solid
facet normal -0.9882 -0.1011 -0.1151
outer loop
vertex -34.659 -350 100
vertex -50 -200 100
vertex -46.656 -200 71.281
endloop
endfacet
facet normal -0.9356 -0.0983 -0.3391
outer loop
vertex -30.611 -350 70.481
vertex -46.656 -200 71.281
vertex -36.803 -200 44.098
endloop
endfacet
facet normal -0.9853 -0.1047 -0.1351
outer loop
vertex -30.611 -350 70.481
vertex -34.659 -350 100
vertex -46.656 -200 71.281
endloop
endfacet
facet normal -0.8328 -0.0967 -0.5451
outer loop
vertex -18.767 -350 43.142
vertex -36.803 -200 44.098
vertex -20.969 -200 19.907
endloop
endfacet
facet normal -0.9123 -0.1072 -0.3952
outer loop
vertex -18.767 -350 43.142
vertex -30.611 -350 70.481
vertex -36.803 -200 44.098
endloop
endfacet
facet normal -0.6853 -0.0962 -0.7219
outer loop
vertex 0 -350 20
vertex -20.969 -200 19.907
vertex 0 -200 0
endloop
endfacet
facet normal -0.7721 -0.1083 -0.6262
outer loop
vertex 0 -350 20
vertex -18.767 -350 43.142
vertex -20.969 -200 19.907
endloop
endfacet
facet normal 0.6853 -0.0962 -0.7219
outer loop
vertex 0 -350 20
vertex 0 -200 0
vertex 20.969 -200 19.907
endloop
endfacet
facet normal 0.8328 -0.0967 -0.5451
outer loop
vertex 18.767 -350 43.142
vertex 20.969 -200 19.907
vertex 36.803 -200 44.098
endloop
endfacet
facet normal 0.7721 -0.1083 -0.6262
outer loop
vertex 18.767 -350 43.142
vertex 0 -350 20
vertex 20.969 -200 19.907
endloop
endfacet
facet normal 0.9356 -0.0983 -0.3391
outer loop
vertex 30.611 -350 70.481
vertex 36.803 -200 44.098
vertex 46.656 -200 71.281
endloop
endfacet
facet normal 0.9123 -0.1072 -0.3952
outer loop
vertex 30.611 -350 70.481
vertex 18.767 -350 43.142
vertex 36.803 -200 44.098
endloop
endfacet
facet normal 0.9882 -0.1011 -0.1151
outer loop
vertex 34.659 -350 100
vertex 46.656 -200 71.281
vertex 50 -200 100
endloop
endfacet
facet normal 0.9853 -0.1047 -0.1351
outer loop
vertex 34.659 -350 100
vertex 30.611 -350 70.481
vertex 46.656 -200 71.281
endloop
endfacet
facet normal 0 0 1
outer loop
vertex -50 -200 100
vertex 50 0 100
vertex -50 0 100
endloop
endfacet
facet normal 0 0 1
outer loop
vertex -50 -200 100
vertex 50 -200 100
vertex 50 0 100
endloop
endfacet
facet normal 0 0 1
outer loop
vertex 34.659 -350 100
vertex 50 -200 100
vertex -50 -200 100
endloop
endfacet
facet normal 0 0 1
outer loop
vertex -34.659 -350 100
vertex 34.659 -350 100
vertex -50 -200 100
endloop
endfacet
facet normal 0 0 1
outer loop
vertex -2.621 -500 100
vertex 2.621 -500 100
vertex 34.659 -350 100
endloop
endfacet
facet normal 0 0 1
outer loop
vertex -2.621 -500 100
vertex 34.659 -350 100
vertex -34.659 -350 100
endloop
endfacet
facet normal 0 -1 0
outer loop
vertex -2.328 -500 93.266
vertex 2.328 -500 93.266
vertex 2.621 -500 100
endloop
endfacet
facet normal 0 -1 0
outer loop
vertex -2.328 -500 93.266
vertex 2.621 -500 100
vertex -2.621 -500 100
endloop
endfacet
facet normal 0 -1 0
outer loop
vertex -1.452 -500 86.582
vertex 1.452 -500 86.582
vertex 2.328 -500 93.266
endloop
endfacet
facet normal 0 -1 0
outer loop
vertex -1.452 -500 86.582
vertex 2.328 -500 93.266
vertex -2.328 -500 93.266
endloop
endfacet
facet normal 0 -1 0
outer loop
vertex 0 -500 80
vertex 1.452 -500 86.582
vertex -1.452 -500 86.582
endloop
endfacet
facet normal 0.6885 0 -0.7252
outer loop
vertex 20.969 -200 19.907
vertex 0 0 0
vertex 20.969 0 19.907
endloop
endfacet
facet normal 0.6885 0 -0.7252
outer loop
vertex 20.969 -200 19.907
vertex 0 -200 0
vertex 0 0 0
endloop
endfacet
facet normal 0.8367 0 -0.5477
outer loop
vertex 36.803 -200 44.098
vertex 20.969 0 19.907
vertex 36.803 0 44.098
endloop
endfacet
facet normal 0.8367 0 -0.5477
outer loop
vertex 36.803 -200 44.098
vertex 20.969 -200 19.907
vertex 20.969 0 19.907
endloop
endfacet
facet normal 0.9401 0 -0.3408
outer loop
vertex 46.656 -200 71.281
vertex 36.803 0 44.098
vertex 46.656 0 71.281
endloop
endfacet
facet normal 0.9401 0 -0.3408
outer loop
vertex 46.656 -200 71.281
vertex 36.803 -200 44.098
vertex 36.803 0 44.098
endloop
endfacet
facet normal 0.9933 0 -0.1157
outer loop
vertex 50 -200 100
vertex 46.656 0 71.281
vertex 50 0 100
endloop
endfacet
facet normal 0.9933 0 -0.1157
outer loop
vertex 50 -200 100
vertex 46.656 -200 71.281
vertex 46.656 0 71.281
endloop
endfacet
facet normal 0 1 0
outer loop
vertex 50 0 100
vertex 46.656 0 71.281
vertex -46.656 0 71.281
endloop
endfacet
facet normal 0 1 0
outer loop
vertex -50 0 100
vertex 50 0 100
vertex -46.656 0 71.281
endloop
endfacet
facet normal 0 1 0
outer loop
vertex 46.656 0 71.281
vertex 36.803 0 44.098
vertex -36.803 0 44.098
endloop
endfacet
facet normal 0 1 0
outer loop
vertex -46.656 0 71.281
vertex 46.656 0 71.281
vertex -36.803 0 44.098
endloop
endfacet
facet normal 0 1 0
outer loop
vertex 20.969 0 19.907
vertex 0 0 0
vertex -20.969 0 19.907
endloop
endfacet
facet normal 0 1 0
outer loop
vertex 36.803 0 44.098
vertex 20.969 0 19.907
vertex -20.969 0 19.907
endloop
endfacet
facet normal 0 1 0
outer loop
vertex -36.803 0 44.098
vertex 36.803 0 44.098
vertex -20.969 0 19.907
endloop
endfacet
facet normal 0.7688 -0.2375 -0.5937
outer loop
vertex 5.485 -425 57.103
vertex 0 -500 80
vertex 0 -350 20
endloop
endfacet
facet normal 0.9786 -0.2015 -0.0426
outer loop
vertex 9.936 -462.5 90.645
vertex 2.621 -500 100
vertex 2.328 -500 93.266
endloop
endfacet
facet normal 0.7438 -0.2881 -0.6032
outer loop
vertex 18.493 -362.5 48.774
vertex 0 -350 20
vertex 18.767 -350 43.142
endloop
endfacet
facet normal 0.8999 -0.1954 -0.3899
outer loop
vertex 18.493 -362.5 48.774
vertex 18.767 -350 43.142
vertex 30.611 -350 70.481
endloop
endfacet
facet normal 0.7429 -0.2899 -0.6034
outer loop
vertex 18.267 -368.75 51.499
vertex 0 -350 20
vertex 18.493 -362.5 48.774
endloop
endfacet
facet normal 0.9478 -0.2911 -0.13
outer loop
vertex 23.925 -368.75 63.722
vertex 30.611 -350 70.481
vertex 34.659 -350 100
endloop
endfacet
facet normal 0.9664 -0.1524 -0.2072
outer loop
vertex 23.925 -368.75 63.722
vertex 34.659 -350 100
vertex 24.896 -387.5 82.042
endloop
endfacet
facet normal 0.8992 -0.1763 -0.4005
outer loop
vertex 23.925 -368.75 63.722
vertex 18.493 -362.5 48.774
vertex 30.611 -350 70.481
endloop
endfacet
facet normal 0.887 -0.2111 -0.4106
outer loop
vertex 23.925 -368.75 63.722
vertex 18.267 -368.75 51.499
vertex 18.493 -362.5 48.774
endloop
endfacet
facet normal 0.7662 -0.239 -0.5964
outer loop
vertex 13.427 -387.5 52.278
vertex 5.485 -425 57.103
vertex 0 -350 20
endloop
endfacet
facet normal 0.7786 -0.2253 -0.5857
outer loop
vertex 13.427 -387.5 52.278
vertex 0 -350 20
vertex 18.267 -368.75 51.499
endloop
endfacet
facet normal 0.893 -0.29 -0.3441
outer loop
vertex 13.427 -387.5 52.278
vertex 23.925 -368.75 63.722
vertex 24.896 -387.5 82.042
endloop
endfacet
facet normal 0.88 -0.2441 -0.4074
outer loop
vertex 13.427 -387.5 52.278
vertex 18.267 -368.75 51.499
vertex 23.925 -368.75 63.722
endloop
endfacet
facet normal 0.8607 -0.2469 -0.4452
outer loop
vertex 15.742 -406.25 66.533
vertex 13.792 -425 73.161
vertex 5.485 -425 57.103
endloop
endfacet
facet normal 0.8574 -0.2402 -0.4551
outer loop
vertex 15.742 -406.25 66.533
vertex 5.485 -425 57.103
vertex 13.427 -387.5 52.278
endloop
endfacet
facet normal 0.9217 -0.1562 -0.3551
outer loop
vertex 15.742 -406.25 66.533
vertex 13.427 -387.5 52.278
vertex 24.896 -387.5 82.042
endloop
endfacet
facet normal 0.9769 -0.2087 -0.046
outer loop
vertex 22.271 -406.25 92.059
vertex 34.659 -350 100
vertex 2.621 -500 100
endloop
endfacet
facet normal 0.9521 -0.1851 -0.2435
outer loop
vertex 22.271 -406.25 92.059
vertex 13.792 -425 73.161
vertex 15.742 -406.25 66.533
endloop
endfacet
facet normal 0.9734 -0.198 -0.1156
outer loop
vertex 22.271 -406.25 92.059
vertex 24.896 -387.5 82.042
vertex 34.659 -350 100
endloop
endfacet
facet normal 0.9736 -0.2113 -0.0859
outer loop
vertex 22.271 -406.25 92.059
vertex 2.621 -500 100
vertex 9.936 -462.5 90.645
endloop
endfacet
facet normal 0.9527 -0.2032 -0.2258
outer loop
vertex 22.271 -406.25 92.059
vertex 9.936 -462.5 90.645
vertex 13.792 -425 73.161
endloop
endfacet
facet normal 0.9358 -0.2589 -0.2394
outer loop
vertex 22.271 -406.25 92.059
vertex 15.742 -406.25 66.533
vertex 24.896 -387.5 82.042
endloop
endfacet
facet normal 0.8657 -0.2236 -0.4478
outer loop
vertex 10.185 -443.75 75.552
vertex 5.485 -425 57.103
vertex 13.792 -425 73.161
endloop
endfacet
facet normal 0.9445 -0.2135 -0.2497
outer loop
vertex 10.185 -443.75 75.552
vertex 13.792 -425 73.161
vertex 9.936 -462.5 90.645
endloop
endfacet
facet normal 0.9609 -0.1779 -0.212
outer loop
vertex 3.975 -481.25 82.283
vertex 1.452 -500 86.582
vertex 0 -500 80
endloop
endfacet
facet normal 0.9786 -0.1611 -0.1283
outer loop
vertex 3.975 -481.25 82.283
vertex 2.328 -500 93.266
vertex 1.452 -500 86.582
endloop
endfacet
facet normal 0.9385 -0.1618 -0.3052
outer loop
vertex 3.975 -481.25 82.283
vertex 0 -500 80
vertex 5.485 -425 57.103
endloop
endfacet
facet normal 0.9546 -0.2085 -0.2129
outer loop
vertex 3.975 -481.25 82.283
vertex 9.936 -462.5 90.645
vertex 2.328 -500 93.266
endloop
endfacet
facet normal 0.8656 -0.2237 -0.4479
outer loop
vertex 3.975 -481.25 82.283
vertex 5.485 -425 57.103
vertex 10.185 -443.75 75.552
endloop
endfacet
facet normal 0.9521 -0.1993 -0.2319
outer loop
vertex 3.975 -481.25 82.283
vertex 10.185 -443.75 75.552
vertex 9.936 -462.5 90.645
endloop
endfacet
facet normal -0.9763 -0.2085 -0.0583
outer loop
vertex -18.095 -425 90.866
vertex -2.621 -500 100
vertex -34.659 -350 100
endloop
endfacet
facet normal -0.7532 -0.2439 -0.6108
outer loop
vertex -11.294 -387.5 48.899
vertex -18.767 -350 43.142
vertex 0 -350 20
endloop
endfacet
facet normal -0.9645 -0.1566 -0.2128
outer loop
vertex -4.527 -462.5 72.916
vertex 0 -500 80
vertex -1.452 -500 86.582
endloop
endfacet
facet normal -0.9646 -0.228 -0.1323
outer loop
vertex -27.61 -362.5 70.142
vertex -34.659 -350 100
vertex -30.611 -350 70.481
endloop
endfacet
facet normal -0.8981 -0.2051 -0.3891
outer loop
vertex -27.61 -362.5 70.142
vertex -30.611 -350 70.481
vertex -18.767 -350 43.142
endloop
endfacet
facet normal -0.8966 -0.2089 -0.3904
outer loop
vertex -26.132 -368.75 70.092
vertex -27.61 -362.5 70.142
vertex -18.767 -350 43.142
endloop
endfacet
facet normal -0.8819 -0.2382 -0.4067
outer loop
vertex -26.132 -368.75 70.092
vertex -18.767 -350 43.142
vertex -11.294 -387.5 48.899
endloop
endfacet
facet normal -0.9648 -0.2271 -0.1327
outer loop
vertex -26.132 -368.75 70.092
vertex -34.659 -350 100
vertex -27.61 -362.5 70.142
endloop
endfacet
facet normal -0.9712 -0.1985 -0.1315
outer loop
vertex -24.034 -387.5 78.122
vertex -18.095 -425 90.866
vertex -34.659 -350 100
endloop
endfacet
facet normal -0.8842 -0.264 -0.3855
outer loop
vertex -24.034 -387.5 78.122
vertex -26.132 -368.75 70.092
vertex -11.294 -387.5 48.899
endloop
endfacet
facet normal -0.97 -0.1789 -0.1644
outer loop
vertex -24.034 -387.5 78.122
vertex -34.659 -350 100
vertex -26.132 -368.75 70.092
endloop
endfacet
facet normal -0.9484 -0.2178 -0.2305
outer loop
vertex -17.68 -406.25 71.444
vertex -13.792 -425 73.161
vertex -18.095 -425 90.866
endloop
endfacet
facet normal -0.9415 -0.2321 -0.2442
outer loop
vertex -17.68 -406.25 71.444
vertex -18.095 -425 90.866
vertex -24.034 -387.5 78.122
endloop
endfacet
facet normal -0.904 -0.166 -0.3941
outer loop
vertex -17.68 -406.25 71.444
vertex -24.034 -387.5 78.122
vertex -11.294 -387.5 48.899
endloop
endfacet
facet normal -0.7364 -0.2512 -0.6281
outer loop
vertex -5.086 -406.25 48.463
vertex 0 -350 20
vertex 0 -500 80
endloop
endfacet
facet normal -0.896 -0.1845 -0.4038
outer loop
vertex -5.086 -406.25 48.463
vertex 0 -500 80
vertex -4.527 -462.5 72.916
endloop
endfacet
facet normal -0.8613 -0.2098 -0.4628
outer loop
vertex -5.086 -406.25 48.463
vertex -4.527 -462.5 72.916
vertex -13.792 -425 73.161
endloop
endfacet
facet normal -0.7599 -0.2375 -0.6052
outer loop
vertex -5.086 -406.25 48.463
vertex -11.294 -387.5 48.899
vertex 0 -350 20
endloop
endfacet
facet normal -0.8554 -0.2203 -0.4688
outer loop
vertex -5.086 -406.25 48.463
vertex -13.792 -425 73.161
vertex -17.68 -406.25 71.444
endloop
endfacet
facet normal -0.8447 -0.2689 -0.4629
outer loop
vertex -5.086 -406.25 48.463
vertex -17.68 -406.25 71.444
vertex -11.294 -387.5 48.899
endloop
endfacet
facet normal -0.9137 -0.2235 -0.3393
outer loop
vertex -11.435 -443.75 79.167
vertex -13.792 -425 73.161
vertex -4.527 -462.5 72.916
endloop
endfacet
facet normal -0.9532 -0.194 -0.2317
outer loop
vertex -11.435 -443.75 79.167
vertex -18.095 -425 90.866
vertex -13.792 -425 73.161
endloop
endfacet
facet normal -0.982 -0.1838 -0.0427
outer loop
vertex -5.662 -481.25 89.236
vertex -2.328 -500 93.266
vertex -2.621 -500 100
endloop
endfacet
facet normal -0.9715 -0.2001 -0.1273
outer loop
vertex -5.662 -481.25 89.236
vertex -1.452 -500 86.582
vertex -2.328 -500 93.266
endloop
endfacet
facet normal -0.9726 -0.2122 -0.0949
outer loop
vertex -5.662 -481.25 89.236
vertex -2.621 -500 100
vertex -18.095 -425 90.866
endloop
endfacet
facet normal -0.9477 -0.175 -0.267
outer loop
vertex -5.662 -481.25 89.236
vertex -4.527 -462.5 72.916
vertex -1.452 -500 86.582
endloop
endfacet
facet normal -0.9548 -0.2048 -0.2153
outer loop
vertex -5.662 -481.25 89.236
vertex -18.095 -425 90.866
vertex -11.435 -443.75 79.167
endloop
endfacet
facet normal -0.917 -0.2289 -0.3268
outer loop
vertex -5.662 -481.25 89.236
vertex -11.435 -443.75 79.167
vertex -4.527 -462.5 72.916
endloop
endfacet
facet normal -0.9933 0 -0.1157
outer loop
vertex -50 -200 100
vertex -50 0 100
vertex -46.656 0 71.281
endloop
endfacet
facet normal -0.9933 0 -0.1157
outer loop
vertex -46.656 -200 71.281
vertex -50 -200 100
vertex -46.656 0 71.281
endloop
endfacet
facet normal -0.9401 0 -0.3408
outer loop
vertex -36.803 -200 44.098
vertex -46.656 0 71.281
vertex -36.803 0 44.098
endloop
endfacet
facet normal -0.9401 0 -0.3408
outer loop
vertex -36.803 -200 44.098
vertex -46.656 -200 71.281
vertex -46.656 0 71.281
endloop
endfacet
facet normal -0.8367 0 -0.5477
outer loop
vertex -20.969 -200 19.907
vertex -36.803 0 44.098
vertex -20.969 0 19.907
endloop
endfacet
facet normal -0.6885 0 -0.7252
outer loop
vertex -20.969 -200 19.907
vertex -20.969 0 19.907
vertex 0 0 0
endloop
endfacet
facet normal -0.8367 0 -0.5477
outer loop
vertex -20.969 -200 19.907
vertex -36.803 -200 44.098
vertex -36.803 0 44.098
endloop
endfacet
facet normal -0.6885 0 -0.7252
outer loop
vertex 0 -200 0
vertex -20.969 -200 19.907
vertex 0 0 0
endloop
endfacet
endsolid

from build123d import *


with BuildPart() as part:
    # Sketch → AdditiveLoft section 0
    with BuildSketch(Plane.XZ):
        with BuildLine():
            ThreePointArc((-50, 100), (-36.803399, 44.098301), (0, 0))
            ThreePointArc((0, 0), (36.803399, 44.098301), (50, 100))
            Line((-50, 100), (50, 100))
        make_face()
    # Sketch003 (on DatumPlane) → AdditiveLoft section 1
    with BuildSketch(Plane.XZ.offset(200)):
        with BuildLine():
            Line((-50, 100), (50, 100))
            ThreePointArc((0, 0), (36.803399, 44.098301), (50, 100))
            ThreePointArc((-50, 100), (-36.803399, 44.098301), (0, 0))
        make_face()
    # Sketch001 (on DatumPlane) → AdditiveLoft section 2
    with BuildSketch(Plane.XZ.offset(350)):
        with BuildLine():
            Line((-34.658561, 100), (34.658561, 100))
            ThreePointArc((0, 20), (25.621549, 56.407524), (34.658561, 100))
            ThreePointArc((-34.658561, 100), (-25.621549, 56.407524), (0, 20))
        make_face()
    # Sketch002 (on DatumPlane) → AdditiveLoft section 3
    with BuildSketch(Plane.XZ.offset(500)):
        with BuildLine():
            Line((-2.620873, 100), (2.620873, 100))
            ThreePointArc((0, 80), (1.962866, 89.914503), (2.620873, 100))
            ThreePointArc((-2.620873, 100), (-1.962866, 89.914503), (0, 80))
        make_face()
    loft(ruled=True)


solid = part.part
